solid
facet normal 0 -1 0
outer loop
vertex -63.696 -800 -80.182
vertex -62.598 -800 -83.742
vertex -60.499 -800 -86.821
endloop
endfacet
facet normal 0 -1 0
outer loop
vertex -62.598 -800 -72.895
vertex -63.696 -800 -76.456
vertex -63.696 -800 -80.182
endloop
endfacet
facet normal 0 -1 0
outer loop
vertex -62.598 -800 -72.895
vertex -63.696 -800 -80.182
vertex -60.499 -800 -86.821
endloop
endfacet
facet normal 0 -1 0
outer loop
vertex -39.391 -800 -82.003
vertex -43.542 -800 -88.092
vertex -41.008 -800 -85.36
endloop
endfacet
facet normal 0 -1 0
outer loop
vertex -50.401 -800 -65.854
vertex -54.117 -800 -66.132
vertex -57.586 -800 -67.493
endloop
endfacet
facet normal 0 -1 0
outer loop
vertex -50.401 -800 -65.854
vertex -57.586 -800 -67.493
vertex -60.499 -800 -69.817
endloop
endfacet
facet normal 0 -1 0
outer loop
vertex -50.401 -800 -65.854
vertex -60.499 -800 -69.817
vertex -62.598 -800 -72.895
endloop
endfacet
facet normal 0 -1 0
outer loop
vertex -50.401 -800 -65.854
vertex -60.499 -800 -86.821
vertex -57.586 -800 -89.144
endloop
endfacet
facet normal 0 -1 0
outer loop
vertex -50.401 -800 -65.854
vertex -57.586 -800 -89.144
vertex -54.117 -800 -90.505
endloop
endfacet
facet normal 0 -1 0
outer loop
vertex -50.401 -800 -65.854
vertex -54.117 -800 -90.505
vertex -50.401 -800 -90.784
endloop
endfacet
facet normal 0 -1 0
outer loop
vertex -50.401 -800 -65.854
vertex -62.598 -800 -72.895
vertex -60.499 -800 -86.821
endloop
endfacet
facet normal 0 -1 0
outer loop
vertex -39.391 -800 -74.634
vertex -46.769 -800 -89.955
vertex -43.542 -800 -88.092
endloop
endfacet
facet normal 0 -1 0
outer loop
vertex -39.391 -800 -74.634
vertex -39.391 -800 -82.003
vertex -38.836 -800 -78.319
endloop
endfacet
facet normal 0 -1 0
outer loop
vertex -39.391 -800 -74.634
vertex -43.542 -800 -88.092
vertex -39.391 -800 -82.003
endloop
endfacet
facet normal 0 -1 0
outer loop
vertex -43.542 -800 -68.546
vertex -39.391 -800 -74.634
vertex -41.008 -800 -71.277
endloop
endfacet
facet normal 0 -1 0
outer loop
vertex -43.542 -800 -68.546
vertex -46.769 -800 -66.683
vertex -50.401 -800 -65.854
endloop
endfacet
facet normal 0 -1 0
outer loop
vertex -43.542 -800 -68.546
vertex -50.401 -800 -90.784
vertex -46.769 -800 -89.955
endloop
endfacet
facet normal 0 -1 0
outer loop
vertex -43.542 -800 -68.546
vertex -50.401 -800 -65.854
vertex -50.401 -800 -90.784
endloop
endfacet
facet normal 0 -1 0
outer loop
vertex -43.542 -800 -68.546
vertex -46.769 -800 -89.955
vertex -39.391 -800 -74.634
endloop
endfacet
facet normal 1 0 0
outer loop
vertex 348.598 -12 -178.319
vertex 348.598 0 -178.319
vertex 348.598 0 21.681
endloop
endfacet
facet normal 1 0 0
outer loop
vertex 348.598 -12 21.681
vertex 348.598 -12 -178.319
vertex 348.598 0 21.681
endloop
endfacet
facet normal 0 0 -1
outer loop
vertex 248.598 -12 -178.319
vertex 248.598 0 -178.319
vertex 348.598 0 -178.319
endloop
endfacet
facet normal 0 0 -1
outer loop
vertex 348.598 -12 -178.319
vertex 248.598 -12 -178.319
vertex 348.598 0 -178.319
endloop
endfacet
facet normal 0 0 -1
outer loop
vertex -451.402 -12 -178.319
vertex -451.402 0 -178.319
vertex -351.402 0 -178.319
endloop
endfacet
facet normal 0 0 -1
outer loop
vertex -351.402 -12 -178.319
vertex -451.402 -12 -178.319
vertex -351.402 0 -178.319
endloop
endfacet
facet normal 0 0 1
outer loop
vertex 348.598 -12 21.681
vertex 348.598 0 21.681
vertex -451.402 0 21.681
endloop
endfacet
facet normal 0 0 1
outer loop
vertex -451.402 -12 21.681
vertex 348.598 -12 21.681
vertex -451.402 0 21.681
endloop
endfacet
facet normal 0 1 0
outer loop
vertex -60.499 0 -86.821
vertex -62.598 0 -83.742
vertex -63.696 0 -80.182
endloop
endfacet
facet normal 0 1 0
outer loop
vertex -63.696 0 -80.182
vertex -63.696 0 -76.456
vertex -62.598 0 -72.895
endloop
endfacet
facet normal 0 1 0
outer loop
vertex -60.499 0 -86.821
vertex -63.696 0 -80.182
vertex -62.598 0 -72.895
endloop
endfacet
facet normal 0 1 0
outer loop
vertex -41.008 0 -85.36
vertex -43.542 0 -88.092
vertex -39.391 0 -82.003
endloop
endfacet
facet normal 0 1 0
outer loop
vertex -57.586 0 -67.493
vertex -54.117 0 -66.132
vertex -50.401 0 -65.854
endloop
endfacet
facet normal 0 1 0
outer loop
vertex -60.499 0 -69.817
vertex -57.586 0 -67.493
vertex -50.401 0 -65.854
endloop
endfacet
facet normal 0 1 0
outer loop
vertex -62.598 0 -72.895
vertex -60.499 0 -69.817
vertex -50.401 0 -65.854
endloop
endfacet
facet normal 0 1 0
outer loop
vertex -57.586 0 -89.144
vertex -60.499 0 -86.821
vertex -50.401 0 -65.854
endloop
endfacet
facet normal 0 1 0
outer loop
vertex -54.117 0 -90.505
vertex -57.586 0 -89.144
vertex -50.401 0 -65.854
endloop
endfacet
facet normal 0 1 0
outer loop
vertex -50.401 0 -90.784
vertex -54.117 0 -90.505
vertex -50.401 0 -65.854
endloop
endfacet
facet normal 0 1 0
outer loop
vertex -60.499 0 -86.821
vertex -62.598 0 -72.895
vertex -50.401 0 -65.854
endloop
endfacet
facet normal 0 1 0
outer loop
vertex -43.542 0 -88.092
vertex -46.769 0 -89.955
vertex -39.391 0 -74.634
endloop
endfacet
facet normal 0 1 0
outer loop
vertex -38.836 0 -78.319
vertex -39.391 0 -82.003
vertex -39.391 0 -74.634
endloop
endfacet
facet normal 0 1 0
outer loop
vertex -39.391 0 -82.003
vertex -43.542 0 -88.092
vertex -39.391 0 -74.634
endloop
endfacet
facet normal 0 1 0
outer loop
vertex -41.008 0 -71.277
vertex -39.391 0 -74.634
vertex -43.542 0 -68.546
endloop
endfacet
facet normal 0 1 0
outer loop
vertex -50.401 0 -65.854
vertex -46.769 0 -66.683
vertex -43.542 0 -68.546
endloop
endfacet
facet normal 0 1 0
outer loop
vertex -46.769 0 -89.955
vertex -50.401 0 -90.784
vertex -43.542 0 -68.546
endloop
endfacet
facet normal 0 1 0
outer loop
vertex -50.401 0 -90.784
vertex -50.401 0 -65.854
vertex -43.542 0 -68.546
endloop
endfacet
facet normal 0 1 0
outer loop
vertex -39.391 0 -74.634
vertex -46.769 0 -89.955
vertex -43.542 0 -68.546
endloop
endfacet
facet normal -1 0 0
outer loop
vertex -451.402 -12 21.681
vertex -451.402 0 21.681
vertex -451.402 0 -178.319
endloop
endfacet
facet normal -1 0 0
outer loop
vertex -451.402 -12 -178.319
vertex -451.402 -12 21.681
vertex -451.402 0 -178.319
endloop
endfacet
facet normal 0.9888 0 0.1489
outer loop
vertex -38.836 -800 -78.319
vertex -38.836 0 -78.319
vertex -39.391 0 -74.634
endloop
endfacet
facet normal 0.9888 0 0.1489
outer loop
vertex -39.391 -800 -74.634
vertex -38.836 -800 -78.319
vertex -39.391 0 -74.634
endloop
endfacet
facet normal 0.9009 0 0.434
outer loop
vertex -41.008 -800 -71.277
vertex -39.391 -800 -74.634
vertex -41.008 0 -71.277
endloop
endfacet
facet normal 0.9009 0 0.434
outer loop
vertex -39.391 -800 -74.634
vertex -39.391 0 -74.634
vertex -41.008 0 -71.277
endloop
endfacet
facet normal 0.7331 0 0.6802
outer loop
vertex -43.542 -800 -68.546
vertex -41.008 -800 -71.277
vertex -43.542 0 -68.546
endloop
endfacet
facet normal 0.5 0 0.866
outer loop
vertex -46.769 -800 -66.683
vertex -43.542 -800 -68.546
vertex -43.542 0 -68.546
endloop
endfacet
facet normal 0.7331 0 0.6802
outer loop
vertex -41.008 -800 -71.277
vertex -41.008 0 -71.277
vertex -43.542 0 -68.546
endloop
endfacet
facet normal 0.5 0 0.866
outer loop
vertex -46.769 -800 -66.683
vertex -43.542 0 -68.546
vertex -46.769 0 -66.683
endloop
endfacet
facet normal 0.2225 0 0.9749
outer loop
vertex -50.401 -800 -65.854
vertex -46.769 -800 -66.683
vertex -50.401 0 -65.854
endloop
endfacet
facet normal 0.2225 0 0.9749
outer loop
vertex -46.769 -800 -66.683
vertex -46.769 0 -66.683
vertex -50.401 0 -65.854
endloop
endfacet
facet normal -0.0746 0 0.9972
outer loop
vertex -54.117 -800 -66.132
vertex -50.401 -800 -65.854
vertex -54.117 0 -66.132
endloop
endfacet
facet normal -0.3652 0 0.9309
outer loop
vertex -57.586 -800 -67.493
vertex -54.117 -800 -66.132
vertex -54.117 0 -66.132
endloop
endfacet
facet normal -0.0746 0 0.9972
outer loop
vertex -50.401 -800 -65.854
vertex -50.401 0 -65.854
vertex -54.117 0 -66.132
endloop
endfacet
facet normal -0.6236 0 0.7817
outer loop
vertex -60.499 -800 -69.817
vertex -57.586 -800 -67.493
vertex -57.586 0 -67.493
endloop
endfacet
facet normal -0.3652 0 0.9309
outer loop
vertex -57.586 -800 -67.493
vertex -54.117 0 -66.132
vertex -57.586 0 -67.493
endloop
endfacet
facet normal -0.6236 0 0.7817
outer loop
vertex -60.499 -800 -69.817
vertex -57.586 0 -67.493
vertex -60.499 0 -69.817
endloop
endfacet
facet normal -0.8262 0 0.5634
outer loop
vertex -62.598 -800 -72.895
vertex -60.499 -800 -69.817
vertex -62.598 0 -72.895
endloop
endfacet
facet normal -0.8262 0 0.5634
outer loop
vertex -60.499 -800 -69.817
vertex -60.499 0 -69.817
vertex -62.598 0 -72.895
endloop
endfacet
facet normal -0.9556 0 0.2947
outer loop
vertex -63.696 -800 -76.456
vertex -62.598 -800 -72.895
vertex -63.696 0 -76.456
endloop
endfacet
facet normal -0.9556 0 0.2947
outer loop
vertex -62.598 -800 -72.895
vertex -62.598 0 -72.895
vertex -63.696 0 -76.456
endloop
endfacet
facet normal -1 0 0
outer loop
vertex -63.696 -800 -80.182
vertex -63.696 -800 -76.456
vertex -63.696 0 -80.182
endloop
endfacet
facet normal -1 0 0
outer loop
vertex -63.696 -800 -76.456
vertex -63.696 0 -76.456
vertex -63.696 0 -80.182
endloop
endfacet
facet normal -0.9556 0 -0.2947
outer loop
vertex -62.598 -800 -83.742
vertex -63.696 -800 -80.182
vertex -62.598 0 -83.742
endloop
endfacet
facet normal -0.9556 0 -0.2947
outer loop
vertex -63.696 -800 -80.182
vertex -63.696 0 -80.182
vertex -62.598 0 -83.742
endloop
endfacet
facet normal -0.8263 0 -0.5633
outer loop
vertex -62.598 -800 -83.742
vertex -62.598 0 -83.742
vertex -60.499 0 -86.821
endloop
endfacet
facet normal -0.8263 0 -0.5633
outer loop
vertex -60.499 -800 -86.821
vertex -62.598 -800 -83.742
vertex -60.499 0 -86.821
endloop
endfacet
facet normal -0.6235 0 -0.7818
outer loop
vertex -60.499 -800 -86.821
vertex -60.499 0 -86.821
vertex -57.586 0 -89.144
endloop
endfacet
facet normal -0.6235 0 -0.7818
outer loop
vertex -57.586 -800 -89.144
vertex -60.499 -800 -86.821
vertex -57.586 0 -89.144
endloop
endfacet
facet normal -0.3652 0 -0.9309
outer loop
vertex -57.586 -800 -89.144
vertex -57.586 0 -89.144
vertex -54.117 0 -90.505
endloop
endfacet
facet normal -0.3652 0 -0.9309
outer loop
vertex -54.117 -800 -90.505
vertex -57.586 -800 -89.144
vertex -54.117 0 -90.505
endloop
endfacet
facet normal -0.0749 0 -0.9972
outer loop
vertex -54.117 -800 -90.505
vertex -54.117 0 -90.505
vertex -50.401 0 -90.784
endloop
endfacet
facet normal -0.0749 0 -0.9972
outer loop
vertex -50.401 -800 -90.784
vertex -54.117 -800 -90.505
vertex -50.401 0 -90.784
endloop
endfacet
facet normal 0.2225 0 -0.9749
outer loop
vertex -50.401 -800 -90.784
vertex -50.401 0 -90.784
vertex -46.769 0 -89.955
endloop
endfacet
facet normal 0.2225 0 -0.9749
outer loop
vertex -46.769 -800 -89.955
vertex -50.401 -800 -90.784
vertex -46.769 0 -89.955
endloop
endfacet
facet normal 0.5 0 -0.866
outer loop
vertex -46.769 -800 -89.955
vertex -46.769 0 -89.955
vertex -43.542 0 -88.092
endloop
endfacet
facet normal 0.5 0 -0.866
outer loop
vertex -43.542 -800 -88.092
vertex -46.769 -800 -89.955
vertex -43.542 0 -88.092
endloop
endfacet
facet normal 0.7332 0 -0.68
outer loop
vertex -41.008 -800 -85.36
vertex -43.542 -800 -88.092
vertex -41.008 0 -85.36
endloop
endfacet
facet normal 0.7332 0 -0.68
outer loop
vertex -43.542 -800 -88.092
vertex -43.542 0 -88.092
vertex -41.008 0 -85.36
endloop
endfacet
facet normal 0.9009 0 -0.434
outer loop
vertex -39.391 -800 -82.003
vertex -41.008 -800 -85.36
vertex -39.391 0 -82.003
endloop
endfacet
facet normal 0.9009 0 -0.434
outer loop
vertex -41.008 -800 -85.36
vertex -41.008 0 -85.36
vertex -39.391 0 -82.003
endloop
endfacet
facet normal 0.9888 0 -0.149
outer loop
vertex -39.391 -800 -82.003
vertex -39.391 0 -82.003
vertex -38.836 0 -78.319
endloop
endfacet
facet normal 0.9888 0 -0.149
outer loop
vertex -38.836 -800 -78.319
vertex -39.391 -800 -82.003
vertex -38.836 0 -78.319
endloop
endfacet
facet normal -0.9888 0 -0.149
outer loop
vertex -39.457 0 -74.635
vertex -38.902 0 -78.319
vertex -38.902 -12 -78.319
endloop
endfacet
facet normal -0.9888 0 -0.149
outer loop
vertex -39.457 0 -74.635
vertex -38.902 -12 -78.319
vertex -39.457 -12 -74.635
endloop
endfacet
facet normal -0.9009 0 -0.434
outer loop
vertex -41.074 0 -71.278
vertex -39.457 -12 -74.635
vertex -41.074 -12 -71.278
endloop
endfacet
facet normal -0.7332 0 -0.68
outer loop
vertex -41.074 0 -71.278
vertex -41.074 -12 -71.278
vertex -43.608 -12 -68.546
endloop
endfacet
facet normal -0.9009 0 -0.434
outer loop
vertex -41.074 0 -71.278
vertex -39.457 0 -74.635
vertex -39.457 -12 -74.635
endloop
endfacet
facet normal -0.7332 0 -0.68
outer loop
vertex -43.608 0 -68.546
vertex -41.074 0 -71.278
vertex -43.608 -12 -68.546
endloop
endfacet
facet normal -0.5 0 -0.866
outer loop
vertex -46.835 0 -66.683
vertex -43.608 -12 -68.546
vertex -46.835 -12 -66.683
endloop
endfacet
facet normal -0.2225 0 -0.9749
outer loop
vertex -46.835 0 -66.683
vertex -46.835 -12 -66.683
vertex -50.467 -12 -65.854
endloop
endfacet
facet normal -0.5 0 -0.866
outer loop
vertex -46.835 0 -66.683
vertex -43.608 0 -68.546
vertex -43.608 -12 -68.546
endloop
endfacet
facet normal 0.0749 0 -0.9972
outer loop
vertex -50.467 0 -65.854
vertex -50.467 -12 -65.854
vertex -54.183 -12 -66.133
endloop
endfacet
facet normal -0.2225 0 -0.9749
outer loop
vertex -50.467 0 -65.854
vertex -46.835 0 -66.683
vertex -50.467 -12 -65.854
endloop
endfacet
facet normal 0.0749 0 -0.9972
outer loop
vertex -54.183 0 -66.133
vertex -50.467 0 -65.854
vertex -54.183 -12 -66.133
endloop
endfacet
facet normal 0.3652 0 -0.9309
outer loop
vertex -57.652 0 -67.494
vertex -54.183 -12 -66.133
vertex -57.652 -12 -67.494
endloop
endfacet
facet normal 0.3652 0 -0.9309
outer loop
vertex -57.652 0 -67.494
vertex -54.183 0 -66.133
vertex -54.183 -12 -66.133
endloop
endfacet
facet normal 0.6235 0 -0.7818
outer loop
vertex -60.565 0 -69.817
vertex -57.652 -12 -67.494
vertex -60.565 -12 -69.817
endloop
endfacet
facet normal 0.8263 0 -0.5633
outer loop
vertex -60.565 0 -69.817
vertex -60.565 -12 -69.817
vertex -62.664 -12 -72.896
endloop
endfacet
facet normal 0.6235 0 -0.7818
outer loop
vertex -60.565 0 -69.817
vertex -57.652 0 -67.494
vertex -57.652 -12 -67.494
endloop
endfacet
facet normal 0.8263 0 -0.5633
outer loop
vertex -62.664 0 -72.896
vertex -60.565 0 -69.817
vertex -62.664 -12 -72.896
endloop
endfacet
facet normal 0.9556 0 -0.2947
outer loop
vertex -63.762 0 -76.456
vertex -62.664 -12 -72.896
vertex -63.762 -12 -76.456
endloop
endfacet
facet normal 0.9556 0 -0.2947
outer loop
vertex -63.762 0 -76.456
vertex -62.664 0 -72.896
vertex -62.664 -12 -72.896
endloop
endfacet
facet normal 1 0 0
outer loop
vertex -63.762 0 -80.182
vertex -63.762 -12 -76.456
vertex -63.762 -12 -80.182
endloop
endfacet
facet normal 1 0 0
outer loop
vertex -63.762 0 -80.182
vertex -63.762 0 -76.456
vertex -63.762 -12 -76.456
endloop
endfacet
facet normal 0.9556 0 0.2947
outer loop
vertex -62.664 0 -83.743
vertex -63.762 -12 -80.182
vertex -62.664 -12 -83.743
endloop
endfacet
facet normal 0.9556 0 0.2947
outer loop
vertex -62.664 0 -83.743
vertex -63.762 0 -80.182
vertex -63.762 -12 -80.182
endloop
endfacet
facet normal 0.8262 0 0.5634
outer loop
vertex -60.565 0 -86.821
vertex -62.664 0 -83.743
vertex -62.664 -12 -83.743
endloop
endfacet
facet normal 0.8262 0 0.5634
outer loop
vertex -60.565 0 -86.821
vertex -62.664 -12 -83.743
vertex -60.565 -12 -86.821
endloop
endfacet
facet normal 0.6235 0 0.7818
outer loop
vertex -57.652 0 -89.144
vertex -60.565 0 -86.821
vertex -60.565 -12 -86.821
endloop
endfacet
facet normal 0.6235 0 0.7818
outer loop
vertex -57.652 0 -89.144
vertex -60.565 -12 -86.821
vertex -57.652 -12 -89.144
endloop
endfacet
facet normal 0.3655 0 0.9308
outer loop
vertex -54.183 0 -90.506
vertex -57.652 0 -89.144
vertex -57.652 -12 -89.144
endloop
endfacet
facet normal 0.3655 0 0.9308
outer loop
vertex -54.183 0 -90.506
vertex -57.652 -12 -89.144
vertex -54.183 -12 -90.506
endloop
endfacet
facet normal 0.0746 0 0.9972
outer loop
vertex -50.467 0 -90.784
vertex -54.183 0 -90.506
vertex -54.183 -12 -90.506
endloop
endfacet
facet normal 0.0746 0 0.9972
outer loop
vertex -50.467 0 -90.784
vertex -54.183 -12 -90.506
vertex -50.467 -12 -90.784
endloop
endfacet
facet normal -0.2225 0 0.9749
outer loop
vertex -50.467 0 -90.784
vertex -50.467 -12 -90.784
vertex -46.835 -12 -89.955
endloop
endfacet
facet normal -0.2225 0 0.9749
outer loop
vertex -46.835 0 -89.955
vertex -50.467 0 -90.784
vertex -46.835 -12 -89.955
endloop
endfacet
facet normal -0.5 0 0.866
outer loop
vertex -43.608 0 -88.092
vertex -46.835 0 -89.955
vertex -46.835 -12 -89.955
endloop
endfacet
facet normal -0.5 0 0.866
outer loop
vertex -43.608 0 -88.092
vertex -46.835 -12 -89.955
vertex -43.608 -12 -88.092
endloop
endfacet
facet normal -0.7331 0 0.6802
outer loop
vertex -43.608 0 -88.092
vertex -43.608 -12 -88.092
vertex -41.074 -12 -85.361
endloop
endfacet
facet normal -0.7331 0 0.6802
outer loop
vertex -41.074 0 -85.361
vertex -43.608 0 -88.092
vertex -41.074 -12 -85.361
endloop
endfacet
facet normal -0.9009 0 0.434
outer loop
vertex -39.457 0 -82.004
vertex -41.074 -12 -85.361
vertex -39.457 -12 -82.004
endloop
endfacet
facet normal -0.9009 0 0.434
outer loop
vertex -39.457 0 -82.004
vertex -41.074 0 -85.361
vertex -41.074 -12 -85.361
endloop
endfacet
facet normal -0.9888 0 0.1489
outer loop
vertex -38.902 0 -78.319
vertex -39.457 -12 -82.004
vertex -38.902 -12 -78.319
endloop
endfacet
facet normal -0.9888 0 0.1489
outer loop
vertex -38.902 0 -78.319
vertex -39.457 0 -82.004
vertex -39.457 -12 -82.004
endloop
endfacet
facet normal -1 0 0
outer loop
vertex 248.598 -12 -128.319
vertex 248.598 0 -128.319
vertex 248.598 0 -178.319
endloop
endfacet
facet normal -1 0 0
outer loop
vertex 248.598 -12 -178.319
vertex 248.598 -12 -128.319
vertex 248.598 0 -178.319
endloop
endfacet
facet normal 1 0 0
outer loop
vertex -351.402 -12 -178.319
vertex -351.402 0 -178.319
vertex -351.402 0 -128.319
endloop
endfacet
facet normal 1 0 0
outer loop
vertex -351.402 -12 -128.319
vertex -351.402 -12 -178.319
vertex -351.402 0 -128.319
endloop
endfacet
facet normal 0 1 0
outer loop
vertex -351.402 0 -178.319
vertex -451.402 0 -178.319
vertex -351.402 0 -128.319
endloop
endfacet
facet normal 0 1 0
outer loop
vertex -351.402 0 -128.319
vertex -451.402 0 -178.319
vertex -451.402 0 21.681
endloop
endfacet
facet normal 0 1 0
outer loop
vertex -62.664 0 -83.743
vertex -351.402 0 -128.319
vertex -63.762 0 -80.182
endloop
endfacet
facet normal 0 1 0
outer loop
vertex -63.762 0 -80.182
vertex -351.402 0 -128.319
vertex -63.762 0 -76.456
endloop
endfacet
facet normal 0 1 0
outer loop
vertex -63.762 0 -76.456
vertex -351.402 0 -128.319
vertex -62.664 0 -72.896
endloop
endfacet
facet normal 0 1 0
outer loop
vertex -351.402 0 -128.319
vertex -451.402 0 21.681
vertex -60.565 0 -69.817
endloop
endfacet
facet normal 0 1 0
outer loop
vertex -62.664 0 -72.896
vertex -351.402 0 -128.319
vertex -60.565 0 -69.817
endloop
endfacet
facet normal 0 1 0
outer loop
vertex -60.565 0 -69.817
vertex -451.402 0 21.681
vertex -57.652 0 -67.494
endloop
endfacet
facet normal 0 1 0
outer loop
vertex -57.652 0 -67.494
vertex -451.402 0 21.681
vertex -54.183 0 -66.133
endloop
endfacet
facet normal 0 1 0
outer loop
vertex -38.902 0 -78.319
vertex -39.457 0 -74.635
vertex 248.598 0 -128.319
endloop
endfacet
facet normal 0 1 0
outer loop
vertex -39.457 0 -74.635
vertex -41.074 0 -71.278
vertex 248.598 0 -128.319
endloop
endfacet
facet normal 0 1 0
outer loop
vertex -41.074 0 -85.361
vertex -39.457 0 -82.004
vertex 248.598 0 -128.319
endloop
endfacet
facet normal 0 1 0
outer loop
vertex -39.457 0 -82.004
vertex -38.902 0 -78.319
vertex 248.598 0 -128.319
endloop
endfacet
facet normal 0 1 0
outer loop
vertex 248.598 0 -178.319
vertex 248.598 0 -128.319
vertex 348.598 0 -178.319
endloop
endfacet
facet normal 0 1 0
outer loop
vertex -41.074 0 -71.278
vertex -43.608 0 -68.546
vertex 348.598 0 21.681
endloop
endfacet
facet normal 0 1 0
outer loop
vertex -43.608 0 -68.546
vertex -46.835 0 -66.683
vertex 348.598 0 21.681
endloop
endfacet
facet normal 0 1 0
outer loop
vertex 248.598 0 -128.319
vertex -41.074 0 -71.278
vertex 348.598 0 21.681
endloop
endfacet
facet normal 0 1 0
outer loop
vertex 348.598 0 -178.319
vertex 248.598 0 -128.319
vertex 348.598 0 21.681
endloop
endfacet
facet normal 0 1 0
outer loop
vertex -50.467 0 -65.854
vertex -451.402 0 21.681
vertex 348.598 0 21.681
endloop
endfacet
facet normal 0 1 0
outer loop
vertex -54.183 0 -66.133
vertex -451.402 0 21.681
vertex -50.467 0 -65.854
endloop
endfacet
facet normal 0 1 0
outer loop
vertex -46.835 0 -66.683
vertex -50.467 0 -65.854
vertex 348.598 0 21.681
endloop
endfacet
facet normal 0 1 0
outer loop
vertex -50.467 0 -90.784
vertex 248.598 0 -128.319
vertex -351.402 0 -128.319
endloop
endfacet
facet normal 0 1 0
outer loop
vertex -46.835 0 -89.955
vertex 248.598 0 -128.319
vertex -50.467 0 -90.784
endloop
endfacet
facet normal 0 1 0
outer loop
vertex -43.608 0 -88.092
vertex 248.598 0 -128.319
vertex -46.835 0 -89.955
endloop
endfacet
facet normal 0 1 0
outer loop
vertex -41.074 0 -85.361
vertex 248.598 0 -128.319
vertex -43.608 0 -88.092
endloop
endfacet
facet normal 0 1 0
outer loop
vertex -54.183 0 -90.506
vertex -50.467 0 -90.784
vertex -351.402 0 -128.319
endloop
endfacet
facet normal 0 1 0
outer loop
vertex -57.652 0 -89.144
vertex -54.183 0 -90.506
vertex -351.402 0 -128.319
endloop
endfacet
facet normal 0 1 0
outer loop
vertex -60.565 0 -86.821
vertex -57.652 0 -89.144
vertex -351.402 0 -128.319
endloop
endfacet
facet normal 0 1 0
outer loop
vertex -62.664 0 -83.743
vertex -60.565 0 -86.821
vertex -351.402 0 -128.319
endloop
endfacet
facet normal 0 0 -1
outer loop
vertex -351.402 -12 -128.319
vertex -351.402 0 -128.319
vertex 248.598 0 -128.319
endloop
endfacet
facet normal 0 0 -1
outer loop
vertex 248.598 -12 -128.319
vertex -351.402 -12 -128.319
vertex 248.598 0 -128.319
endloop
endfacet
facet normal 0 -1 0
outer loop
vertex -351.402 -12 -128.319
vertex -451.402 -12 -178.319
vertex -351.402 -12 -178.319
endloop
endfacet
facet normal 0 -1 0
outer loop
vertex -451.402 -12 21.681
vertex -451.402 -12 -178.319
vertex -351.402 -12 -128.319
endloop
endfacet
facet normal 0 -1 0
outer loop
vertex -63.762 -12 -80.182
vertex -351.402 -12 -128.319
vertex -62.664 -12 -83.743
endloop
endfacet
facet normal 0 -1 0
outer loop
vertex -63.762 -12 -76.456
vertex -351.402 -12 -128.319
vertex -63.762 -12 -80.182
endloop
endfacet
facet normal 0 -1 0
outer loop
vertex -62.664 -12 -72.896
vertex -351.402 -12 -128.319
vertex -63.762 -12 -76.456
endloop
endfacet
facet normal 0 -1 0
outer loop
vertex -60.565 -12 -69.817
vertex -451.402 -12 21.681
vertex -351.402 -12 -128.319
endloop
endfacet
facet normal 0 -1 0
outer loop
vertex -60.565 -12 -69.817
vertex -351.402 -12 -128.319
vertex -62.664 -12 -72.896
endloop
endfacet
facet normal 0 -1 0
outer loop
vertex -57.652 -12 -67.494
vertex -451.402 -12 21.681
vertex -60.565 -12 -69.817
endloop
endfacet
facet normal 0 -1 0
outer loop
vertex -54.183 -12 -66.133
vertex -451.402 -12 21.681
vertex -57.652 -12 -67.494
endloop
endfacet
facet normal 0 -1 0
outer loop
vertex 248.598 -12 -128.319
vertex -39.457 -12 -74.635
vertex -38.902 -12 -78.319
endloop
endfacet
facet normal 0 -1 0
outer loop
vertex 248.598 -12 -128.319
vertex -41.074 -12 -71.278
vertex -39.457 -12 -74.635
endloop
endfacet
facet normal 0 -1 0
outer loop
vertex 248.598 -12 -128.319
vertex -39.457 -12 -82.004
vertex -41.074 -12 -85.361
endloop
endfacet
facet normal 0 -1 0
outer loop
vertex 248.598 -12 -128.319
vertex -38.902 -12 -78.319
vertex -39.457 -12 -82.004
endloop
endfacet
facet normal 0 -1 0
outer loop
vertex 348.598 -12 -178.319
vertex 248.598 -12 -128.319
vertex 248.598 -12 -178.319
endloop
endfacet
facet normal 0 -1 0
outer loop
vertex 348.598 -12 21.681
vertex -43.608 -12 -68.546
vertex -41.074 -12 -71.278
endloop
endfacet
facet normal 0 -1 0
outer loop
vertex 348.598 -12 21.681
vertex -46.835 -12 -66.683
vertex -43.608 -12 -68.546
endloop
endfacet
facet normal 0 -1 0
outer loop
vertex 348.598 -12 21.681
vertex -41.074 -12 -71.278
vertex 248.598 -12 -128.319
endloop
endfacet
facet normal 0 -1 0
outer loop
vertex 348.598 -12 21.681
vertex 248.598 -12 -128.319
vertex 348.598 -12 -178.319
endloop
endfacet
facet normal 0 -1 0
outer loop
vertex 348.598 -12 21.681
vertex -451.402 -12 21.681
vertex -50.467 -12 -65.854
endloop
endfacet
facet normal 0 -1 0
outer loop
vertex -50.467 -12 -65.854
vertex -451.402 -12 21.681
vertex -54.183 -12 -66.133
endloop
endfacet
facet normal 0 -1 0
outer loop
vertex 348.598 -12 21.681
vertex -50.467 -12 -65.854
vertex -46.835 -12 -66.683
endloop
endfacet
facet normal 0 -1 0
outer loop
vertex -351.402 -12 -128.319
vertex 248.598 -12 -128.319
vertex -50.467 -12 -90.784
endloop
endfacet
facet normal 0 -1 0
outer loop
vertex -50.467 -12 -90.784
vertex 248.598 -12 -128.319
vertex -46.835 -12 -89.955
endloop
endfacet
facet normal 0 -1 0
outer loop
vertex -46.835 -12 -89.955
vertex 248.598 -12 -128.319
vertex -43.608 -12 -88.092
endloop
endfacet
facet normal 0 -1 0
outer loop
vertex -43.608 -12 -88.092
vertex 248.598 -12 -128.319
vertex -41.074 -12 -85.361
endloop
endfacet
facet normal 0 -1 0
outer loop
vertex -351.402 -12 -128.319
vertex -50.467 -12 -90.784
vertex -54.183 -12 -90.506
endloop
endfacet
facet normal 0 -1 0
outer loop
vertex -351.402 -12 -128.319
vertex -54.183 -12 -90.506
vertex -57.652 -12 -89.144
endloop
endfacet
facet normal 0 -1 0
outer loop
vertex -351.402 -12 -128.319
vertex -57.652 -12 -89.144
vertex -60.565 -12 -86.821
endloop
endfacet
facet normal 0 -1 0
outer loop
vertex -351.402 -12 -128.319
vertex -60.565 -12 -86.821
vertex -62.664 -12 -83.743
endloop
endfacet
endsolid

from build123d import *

# Parameters (mm, degrees)
F0_R     = 12.5
F2_DEPTH = 12
F1_R     = 12.5
F3_DEPTH = 800


with BuildPart() as f2:
    # F0 (on Front) → F2 (new body)
    with BuildSketch(Plane.XZ):
        Polygon((348.598435, 21.680824), (-451.401565, 21.680824), (-451.401565, -178.319176), (-351.401565, -178.319176), (-351.401565, -128.319176), (248.598435, -128.319176), (248.598435, -178.319176), (348.598435, -178.319176), align=None)
        with Locations((-51.401565, -78.319176)):
            Circle(F0_R, mode=Mode.SUBTRACT)
    extrude(amount=F2_DEPTH)


with BuildPart() as f3:
    # F1 (on Front) → F3 (new body)
    with BuildSketch(Plane.XZ):
        with Locations((-51.335566, -78.318708)):
            Circle(F1_R)
    extrude(amount=F3_DEPTH)


solid = Compound([f2.part, f3.part])
